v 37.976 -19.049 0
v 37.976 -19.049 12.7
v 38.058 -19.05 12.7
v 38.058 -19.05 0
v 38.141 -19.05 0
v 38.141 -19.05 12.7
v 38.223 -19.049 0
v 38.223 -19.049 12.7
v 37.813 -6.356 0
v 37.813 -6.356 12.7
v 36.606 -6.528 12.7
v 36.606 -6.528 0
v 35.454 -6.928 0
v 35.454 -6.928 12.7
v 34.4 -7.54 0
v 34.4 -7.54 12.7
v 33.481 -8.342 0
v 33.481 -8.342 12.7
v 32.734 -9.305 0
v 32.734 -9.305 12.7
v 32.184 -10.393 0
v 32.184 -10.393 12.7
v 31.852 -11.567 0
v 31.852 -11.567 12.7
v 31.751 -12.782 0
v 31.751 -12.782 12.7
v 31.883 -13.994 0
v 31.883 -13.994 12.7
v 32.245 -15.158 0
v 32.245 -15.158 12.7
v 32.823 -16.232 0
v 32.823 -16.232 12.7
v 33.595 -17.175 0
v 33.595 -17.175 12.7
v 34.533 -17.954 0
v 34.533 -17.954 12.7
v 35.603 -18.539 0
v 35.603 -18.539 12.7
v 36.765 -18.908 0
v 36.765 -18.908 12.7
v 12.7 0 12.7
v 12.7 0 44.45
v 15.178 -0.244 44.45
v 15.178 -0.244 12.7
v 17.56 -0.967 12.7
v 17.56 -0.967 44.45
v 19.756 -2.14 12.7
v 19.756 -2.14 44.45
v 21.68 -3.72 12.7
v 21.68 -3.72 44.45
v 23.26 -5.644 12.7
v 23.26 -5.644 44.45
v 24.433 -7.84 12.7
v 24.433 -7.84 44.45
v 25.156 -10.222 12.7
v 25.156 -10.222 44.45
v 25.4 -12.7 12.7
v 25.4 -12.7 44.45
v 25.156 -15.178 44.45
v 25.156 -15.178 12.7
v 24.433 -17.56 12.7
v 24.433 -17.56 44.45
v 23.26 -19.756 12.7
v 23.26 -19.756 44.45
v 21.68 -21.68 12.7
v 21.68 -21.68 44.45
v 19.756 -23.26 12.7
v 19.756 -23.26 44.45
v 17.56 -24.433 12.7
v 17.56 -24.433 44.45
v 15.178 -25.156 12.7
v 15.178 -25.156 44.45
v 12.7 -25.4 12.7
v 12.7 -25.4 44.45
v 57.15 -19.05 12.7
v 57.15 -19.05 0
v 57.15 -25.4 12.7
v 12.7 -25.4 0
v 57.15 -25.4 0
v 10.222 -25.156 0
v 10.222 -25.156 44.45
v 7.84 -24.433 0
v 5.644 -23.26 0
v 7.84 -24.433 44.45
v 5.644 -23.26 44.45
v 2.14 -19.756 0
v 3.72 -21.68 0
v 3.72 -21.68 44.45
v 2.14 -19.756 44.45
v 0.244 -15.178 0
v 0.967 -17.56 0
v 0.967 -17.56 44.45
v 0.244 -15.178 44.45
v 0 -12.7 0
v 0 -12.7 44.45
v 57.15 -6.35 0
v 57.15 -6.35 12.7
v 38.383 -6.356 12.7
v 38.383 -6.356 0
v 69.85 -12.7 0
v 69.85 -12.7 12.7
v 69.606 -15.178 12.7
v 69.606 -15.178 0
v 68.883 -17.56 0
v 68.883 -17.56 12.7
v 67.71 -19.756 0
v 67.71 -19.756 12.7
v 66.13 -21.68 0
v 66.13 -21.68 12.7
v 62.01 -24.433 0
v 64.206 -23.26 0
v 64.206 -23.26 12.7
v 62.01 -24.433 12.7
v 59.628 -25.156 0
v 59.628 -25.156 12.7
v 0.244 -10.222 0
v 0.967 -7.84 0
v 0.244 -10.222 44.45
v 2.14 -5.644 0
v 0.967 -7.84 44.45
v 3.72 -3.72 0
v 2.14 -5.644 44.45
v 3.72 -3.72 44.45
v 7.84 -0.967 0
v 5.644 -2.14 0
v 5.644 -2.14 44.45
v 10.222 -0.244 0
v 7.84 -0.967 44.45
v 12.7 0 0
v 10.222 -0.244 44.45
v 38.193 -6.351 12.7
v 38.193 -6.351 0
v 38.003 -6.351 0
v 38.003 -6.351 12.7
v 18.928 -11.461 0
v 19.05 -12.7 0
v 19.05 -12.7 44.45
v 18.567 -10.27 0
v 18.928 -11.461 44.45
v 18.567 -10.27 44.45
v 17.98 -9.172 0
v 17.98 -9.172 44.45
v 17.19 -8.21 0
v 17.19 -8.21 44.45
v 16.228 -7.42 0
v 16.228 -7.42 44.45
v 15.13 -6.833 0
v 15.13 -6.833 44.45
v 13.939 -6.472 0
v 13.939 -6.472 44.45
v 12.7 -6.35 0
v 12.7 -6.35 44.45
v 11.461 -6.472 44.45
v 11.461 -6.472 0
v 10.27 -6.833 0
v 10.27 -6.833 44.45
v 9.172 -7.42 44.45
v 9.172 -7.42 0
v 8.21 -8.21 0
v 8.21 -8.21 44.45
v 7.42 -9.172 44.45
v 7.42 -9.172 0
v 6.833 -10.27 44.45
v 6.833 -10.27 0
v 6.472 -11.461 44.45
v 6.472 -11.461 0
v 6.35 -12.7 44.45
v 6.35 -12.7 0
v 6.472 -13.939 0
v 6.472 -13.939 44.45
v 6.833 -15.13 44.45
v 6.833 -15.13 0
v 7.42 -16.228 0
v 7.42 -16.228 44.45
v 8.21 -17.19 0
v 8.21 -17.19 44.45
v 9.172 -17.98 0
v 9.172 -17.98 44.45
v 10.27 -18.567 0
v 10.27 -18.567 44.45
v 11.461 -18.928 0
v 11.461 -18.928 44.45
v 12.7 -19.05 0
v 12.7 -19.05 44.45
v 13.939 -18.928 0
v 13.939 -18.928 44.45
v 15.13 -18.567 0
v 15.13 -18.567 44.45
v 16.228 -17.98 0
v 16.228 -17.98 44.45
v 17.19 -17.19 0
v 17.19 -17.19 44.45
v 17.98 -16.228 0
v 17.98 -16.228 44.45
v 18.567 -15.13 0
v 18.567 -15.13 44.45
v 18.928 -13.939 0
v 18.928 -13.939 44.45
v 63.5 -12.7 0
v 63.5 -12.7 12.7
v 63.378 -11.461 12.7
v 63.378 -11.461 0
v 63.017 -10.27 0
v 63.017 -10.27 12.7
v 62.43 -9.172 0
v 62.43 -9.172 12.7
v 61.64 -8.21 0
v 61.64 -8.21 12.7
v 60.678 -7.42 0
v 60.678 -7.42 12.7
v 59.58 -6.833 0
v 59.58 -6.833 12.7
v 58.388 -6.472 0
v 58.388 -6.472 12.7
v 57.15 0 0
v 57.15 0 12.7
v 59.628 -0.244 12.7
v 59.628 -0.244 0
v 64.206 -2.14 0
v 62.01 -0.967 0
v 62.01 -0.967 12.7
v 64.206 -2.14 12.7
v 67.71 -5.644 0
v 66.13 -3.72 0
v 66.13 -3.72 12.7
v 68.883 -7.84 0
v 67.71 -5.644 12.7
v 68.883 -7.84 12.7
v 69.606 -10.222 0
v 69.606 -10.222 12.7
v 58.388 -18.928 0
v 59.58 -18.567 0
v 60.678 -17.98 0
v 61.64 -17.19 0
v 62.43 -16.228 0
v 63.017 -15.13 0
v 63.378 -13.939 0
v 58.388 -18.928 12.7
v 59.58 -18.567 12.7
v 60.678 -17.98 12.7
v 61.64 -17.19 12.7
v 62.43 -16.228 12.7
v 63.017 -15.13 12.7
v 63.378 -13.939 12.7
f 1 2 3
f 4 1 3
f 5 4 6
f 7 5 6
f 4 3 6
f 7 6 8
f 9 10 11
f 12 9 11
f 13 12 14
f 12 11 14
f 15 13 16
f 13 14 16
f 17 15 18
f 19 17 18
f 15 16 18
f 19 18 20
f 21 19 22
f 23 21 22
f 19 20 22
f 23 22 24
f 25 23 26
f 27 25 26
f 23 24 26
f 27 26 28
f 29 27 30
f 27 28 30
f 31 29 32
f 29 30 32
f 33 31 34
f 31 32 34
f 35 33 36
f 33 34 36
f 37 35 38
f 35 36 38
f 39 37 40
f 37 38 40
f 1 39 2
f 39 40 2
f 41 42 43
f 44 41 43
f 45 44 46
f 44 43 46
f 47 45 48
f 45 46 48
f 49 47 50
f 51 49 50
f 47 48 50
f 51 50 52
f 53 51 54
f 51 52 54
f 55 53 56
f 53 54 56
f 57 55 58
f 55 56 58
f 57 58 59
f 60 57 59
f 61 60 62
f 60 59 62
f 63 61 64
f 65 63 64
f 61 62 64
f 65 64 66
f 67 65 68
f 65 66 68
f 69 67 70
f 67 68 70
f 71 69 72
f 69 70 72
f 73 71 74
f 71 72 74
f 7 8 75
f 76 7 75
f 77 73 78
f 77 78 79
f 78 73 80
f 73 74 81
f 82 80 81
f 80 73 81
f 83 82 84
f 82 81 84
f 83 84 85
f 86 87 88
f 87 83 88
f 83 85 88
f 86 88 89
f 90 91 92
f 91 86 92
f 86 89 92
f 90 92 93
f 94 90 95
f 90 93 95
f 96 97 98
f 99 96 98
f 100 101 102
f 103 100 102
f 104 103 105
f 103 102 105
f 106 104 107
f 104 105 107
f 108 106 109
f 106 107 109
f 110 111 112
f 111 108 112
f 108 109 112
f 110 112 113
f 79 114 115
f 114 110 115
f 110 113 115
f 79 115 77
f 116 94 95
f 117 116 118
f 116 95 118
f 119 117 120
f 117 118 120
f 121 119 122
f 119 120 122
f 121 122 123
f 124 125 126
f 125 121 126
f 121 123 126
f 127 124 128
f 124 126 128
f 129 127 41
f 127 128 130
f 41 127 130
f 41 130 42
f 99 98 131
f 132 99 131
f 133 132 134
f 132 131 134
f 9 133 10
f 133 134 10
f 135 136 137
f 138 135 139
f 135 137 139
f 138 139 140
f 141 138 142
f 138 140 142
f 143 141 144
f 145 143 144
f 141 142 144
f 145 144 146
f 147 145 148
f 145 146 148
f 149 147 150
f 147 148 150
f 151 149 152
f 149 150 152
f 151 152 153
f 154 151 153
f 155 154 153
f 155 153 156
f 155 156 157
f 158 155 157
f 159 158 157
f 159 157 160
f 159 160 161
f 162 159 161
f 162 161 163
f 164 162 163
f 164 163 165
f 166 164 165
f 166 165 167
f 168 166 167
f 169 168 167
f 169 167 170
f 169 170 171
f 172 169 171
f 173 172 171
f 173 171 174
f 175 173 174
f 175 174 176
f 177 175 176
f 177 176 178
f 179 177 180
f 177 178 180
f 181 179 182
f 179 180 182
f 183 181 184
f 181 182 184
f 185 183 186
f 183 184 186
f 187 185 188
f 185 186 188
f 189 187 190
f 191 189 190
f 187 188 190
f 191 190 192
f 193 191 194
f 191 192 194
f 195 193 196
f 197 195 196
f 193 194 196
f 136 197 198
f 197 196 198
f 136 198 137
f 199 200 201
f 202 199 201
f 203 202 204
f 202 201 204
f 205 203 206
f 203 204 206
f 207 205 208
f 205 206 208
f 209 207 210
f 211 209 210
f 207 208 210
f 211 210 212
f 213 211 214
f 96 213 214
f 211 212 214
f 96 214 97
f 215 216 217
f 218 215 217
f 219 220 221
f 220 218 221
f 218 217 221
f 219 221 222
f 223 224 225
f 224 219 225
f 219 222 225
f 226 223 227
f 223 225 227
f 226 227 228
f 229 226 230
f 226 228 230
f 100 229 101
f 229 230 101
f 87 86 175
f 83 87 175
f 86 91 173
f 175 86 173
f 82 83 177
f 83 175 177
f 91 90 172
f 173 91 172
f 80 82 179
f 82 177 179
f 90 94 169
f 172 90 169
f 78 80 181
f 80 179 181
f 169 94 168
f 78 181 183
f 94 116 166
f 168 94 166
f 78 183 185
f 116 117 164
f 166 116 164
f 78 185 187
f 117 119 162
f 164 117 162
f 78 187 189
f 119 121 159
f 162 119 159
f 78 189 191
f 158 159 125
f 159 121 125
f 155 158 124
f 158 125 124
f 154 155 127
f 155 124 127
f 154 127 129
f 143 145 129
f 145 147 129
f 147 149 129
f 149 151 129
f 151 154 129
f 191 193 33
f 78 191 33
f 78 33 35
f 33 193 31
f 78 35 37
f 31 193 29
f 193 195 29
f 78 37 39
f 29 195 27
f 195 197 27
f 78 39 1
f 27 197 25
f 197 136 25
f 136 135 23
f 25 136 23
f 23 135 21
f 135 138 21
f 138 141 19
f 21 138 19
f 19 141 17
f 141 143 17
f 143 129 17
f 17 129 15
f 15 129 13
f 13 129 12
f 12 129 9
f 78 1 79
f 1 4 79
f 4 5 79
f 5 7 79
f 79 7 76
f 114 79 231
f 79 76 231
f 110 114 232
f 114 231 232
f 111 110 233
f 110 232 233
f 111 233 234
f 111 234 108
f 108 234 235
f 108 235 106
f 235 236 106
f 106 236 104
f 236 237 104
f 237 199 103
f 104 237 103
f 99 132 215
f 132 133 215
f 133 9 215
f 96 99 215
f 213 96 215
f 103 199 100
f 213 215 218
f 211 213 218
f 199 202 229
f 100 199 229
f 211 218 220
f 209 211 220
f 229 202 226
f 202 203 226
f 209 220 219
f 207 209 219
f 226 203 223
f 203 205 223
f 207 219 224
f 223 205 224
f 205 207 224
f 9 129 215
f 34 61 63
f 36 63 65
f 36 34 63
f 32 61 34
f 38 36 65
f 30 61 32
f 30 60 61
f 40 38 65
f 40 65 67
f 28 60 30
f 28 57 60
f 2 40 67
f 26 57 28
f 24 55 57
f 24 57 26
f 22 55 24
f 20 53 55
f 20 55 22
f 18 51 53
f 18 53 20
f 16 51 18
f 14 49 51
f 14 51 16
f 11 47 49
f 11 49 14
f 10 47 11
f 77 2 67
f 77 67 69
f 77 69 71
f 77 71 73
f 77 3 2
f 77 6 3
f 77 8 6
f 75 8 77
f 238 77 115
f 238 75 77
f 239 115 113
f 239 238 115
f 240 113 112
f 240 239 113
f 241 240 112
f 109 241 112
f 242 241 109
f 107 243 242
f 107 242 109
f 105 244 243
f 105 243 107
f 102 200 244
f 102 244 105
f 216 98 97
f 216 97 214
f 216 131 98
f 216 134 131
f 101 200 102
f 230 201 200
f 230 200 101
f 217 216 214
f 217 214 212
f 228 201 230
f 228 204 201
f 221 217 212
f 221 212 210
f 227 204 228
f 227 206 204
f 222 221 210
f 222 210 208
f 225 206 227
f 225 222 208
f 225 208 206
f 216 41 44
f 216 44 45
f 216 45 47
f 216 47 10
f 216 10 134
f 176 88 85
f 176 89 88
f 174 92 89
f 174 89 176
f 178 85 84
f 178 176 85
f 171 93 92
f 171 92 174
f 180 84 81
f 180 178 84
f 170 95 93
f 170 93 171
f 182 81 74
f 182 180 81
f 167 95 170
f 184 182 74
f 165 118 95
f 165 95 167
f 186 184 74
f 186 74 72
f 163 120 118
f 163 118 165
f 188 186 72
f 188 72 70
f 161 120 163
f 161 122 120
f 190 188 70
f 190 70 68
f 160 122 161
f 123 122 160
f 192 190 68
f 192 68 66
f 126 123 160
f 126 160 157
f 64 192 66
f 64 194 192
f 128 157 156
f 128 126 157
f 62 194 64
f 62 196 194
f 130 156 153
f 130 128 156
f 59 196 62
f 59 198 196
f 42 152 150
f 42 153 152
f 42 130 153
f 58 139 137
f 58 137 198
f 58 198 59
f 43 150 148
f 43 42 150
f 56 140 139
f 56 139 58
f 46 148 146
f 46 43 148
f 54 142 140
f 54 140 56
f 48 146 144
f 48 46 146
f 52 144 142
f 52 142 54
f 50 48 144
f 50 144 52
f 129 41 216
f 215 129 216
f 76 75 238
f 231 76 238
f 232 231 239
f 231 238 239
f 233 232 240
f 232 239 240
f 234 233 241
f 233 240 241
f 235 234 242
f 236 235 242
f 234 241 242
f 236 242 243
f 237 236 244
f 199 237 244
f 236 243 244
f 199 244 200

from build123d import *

# Parameters (mm, degrees)
F0_W      = 69.85
F0_H      = 44.45
F1_DEPTH  = 25.4
F2_W      = 44.45
F2_H      = 31.75
F3_DEPTH  = 25.4
F5_DEPTH  = 50.8
F7_DEPTH  = 50.8
F9_DEPTH  = 31.75
F11_DEPTH = 31.75
F13_DEPTH = 25.4
F14_R     = 6.35
F15_DEPTH = 50.8
F17_DEPTH = 25.4


# Not quite as in the source:
# - ends of sketch curves that miss each other by under 0.0002 mm in the source are joined


with BuildPart() as f1:
    # F0 (on Front) → F1 (new body)
    with BuildSketch(Plane.XZ):
        with Locations((34.925, 22.225)):
            Rectangle(F0_W, F0_H)
    extrude(amount=F1_DEPTH)

    # F2 (on face) → F3 (cut)
    with BuildSketch(Plane.XZ.offset(25.4)):
        with Locations((47.625, 28.575)):
            Rectangle(F2_W, F2_H)
    extrude(amount=-F3_DEPTH, mode=Mode.SUBTRACT)

    # F4 (on face) → F5 (cut)
    with BuildSketch(Plane.XY.offset(44.45)):
        with BuildLine():
            ThreePointArc((0, -12.7), (3.7197438789, -3.7197438789), (12.7, 0))
            Line((12.7, 0), (0, 0))
            Line((0, 0), (0, -12.7))
        make_face()
    extrude(amount=-F5_DEPTH, mode=Mode.SUBTRACT)

    # F6 (on face) → F7 (cut)
    with BuildSketch(Plane.XY.offset(44.45)):
        with BuildLine():
            ThreePointArc((12.7, -25.4), (3.7197438789, -21.6802561211), (0, -12.7))
            Line((0, -12.7), (0, -25.4))
            Line((0, -25.4), (12.7, -25.4))
        make_face()
    extrude(amount=-F7_DEPTH, mode=Mode.SUBTRACT)

    # F8 (on face) → F9 (cut)
    with BuildSketch(Plane.XY.offset(44.45)):
        with BuildLine():
            ThreePointArc((25.4, -12.7), (21.6802561211, -21.6802561211), (12.7, -25.4))
            Line((12.7, -25.4), (25.4, -25.4))
            Line((25.4, -25.4), (25.4, -12.7))
        make_face()
    extrude(amount=-F9_DEPTH, mode=Mode.SUBTRACT)

    # F10 (on face) → F11 (cut)
    with BuildSketch(Plane.XY.offset(44.45)):
        with BuildLine():
            ThreePointArc((12.7, 0), (21.6802561211, -3.7197438789), (25.4, -12.7))
            Line((25.4, -12.7), (25.4, 0))
            Line((25.4, 0), (12.7, 0))
        make_face()
    extrude(amount=-F11_DEPTH, mode=Mode.SUBTRACT)

    # F12 (on face) → F13 (cut)
    with BuildSketch(Plane.XY.offset(12.7)):
        with BuildLine():
            ThreePointArc((57.1496006293, -19.0499999874), (50.8, -12.7), (57.1496006293, -6.3500000126))
            Line((57.1496006293, -6.3500000126), (38.3825719247, -6.3562902725))
            ThreePointArc((38.3825719247, -6.3562902725), (42.6889449616, -8.3109130632), (44.45, -12.7))
            ThreePointArc((44.45, -12.7), (42.6333883945, -17.1464468584), (38.2229481372, -19.048809633))
            Line((38.2229481372, -19.048809633), (57.1496006293, -19.0499999874))
        make_face()
        with BuildLine():
            ThreePointArc((57.1496006293, -19.0499999874), (61.6399868594, -17.1902692572), (63.5, -12.7))
            ThreePointArc((63.5, -12.7), (61.6399868594, -8.2097307428), (57.1496006293, -6.3500000126))
            ThreePointArc((57.1496006293, -6.3500000126), (50.8, -12.7), (57.1496006293, -19.0499999874))
        make_face()
        with BuildLine():
            Line((37.81317546, -6.3564811277), (38.3825719247, -6.3562902725))
            ThreePointArc((38.3825719247, -6.3562902725), (38.0978715521, -6.3500003567), (37.81317546, -6.3564811277))
        make_face()
        with BuildLine():
            ThreePointArc((44.45, -12.7), (42.6889449616, -8.3109130632), (38.3825719247, -6.3562902725))
            Line((38.3825719247, -6.3562902725), (37.81317546, -6.3564811277))
            ThreePointArc((37.81317546, -6.3564811277), (31.7505240807, -12.7815815558), (37.9762532721, -19.0487941176))
            Line((37.9762532721, -19.0487941176), (38.2229481372, -19.048809633))
            ThreePointArc((38.2229481372, -19.048809633), (42.6333883945, -17.1464468584), (44.45, -12.7))
        make_face()
        with BuildLine():
            ThreePointArc((37.9762532721, -19.0487941176), (38.0996006293, -19.0499999874), (38.2229481372, -19.048809633))
            Line((38.2229481372, -19.048809633), (37.9762532721, -19.0487941176))
        make_face()
    extrude(amount=-F13_DEPTH, mode=Mode.SUBTRACT)

    # F14 (on face) → F15 (cut)
    with BuildSketch(Plane.XY.offset(44.45)):
        with Locations((12.7, -12.7)):
            Circle(F14_R)
    extrude(amount=-F15_DEPTH, mode=Mode.SUBTRACT)

    # F16 (on face) → F17 (cut)
    with BuildSketch(Plane.XY.offset(12.7)):
        with BuildLine():
            Line((69.85, -25.4), (69.85, -12.7))
            ThreePointArc((69.85, -12.7), (66.1302561211, -21.6802561211), (57.15, -25.4))
            Line((57.15, -25.4), (69.85, -25.4))
        make_face()
        with BuildLine():
            ThreePointArc((57.15, 0), (66.1302561211, -3.7197438789), (69.85, -12.7))
            Line((69.85, -12.7), (69.85, 0))
            Line((69.85, 0), (57.15, 0))
        make_face()
    extrude(amount=-F17_DEPTH, mode=Mode.SUBTRACT)


solid = f1.part
